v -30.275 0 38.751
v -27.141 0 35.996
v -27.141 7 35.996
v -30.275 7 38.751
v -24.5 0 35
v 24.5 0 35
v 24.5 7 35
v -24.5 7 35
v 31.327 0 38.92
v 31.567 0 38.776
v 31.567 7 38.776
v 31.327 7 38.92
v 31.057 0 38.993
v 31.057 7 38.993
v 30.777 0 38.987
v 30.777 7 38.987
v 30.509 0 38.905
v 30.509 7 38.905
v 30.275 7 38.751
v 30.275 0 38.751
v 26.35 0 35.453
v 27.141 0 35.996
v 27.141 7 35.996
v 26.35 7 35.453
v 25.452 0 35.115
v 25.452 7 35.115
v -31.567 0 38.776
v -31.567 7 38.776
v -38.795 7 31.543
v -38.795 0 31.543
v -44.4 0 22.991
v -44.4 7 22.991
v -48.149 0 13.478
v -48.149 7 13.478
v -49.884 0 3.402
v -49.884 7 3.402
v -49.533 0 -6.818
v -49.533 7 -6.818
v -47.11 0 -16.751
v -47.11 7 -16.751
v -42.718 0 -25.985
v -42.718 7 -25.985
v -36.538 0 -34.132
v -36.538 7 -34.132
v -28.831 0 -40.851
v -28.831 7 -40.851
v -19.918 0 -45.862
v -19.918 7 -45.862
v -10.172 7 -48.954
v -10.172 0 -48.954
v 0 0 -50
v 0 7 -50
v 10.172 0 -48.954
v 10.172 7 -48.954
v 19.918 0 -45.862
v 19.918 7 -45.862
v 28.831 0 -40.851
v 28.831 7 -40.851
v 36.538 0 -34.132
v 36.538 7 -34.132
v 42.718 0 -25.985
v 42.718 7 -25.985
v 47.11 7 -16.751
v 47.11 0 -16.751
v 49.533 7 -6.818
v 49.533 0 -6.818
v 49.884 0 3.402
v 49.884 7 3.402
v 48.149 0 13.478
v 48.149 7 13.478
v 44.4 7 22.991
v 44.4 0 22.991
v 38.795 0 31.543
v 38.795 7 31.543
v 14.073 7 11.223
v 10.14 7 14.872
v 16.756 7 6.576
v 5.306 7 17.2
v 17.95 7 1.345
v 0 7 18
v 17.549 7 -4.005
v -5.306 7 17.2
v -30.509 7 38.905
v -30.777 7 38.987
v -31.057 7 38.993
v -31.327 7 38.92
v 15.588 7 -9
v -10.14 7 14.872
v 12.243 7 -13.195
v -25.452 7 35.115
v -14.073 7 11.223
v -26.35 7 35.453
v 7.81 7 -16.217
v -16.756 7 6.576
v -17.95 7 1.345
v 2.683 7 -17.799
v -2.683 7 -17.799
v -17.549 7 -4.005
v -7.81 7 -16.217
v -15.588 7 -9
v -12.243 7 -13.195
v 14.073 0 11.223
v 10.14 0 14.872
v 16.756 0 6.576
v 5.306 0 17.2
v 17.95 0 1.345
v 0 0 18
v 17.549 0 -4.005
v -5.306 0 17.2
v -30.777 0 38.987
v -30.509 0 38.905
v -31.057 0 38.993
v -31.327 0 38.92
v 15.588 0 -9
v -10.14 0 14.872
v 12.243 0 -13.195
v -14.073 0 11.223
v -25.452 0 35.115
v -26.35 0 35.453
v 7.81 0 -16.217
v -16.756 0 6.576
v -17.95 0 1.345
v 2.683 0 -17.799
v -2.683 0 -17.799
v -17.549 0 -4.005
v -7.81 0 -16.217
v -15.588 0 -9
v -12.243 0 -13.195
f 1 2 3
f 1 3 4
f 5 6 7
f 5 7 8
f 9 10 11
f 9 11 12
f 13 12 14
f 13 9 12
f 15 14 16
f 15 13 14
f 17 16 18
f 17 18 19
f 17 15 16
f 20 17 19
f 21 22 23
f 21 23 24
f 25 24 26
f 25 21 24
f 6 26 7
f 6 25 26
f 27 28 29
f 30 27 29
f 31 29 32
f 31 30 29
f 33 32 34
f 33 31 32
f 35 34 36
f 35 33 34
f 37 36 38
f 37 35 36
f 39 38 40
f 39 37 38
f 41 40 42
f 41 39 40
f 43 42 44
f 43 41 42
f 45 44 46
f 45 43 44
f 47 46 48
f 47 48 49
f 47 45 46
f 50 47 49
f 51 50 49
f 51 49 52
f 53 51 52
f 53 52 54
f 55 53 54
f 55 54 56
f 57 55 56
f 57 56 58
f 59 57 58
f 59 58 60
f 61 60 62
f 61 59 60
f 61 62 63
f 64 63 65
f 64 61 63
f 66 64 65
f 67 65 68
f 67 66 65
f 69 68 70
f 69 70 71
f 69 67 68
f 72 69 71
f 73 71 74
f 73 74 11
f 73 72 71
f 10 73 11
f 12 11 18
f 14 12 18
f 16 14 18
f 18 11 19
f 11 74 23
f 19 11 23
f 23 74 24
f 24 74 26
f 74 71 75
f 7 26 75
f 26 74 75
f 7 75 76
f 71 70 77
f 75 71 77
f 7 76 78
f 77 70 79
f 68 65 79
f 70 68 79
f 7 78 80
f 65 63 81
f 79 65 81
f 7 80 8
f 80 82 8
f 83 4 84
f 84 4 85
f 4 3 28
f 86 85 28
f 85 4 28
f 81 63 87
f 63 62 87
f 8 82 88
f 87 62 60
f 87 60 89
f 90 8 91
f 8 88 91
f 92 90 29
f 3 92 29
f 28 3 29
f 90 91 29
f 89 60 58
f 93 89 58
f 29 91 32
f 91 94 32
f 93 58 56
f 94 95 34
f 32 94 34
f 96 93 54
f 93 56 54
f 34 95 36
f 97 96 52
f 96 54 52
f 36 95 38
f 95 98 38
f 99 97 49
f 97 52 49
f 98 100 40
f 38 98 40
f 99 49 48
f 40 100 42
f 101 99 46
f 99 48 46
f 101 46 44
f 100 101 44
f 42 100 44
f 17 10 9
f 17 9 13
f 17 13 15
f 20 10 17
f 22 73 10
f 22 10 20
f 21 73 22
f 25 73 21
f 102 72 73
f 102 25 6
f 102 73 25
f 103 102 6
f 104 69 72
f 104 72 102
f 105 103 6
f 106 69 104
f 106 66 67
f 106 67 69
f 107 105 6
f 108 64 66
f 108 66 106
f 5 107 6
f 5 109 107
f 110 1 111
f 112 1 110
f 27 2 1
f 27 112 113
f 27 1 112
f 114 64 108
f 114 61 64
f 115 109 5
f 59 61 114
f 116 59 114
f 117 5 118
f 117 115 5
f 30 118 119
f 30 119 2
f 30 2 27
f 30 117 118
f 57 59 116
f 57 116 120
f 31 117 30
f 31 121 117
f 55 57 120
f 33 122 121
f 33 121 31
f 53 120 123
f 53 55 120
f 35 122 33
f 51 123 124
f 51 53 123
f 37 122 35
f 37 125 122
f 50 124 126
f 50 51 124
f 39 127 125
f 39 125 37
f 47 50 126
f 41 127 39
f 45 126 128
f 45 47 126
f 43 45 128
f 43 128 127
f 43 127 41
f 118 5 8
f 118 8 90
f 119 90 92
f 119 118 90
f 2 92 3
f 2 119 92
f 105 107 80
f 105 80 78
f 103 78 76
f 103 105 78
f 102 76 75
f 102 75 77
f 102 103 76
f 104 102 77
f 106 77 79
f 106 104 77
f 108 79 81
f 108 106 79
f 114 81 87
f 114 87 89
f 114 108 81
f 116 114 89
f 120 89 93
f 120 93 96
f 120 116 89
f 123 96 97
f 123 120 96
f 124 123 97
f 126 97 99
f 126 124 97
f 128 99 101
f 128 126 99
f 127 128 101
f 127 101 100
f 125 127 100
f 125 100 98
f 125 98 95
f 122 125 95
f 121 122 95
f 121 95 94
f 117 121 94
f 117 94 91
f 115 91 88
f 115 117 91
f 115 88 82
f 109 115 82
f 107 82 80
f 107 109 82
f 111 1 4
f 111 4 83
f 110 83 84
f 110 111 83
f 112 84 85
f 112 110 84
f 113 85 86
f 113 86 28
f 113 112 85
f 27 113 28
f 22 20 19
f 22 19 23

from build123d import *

# Parameters (mm, degrees)
SKETCH1_R           = 18
BOSS_EXTRUDE1_DEPTH = 7


with BuildPart() as part:
    # Sketch1 → Boss-Extrude1 (new body)
    with BuildSketch(Plane(origin=(0, 0, 0), x_dir=(1, 0, 0), z_dir=(0, 1, 0))):
        with BuildLine():
            Line((24.5, -35), (-24.5, -35))
            ThreePointArc((-24.5, -35), (-25.911238902, -35.257219648), (-27.140978616, -35.995797619))
            Line((-27.140978616, -35.995797619), (-30.275171942, -38.751050595))
            ThreePointArc((-30.275171942, -38.751050595), (-30.916482245, -38.999820729), (-31.566751629, -38.775510204))
            ThreePointArc((-31.566751629, -38.775510204), (0, 50), (31.566751629, -38.775510204))
            ThreePointArc((31.566751629, -38.775510204), (30.916482245, -38.999820729), (30.275171942, -38.751050595))
            Line((30.275171942, -38.751050595), (27.140978616, -35.995797619))
            ThreePointArc((27.140978616, -35.995797619), (25.911238902, -35.257219648), (24.5, -35))
        make_face()
        with Locations(Location((0, 0, 0), (0, 0, 270))):
            Circle(SKETCH1_R, mode=Mode.SUBTRACT)
    extrude(amount=BOSS_EXTRUDE1_DEPTH)


solid = part.part
